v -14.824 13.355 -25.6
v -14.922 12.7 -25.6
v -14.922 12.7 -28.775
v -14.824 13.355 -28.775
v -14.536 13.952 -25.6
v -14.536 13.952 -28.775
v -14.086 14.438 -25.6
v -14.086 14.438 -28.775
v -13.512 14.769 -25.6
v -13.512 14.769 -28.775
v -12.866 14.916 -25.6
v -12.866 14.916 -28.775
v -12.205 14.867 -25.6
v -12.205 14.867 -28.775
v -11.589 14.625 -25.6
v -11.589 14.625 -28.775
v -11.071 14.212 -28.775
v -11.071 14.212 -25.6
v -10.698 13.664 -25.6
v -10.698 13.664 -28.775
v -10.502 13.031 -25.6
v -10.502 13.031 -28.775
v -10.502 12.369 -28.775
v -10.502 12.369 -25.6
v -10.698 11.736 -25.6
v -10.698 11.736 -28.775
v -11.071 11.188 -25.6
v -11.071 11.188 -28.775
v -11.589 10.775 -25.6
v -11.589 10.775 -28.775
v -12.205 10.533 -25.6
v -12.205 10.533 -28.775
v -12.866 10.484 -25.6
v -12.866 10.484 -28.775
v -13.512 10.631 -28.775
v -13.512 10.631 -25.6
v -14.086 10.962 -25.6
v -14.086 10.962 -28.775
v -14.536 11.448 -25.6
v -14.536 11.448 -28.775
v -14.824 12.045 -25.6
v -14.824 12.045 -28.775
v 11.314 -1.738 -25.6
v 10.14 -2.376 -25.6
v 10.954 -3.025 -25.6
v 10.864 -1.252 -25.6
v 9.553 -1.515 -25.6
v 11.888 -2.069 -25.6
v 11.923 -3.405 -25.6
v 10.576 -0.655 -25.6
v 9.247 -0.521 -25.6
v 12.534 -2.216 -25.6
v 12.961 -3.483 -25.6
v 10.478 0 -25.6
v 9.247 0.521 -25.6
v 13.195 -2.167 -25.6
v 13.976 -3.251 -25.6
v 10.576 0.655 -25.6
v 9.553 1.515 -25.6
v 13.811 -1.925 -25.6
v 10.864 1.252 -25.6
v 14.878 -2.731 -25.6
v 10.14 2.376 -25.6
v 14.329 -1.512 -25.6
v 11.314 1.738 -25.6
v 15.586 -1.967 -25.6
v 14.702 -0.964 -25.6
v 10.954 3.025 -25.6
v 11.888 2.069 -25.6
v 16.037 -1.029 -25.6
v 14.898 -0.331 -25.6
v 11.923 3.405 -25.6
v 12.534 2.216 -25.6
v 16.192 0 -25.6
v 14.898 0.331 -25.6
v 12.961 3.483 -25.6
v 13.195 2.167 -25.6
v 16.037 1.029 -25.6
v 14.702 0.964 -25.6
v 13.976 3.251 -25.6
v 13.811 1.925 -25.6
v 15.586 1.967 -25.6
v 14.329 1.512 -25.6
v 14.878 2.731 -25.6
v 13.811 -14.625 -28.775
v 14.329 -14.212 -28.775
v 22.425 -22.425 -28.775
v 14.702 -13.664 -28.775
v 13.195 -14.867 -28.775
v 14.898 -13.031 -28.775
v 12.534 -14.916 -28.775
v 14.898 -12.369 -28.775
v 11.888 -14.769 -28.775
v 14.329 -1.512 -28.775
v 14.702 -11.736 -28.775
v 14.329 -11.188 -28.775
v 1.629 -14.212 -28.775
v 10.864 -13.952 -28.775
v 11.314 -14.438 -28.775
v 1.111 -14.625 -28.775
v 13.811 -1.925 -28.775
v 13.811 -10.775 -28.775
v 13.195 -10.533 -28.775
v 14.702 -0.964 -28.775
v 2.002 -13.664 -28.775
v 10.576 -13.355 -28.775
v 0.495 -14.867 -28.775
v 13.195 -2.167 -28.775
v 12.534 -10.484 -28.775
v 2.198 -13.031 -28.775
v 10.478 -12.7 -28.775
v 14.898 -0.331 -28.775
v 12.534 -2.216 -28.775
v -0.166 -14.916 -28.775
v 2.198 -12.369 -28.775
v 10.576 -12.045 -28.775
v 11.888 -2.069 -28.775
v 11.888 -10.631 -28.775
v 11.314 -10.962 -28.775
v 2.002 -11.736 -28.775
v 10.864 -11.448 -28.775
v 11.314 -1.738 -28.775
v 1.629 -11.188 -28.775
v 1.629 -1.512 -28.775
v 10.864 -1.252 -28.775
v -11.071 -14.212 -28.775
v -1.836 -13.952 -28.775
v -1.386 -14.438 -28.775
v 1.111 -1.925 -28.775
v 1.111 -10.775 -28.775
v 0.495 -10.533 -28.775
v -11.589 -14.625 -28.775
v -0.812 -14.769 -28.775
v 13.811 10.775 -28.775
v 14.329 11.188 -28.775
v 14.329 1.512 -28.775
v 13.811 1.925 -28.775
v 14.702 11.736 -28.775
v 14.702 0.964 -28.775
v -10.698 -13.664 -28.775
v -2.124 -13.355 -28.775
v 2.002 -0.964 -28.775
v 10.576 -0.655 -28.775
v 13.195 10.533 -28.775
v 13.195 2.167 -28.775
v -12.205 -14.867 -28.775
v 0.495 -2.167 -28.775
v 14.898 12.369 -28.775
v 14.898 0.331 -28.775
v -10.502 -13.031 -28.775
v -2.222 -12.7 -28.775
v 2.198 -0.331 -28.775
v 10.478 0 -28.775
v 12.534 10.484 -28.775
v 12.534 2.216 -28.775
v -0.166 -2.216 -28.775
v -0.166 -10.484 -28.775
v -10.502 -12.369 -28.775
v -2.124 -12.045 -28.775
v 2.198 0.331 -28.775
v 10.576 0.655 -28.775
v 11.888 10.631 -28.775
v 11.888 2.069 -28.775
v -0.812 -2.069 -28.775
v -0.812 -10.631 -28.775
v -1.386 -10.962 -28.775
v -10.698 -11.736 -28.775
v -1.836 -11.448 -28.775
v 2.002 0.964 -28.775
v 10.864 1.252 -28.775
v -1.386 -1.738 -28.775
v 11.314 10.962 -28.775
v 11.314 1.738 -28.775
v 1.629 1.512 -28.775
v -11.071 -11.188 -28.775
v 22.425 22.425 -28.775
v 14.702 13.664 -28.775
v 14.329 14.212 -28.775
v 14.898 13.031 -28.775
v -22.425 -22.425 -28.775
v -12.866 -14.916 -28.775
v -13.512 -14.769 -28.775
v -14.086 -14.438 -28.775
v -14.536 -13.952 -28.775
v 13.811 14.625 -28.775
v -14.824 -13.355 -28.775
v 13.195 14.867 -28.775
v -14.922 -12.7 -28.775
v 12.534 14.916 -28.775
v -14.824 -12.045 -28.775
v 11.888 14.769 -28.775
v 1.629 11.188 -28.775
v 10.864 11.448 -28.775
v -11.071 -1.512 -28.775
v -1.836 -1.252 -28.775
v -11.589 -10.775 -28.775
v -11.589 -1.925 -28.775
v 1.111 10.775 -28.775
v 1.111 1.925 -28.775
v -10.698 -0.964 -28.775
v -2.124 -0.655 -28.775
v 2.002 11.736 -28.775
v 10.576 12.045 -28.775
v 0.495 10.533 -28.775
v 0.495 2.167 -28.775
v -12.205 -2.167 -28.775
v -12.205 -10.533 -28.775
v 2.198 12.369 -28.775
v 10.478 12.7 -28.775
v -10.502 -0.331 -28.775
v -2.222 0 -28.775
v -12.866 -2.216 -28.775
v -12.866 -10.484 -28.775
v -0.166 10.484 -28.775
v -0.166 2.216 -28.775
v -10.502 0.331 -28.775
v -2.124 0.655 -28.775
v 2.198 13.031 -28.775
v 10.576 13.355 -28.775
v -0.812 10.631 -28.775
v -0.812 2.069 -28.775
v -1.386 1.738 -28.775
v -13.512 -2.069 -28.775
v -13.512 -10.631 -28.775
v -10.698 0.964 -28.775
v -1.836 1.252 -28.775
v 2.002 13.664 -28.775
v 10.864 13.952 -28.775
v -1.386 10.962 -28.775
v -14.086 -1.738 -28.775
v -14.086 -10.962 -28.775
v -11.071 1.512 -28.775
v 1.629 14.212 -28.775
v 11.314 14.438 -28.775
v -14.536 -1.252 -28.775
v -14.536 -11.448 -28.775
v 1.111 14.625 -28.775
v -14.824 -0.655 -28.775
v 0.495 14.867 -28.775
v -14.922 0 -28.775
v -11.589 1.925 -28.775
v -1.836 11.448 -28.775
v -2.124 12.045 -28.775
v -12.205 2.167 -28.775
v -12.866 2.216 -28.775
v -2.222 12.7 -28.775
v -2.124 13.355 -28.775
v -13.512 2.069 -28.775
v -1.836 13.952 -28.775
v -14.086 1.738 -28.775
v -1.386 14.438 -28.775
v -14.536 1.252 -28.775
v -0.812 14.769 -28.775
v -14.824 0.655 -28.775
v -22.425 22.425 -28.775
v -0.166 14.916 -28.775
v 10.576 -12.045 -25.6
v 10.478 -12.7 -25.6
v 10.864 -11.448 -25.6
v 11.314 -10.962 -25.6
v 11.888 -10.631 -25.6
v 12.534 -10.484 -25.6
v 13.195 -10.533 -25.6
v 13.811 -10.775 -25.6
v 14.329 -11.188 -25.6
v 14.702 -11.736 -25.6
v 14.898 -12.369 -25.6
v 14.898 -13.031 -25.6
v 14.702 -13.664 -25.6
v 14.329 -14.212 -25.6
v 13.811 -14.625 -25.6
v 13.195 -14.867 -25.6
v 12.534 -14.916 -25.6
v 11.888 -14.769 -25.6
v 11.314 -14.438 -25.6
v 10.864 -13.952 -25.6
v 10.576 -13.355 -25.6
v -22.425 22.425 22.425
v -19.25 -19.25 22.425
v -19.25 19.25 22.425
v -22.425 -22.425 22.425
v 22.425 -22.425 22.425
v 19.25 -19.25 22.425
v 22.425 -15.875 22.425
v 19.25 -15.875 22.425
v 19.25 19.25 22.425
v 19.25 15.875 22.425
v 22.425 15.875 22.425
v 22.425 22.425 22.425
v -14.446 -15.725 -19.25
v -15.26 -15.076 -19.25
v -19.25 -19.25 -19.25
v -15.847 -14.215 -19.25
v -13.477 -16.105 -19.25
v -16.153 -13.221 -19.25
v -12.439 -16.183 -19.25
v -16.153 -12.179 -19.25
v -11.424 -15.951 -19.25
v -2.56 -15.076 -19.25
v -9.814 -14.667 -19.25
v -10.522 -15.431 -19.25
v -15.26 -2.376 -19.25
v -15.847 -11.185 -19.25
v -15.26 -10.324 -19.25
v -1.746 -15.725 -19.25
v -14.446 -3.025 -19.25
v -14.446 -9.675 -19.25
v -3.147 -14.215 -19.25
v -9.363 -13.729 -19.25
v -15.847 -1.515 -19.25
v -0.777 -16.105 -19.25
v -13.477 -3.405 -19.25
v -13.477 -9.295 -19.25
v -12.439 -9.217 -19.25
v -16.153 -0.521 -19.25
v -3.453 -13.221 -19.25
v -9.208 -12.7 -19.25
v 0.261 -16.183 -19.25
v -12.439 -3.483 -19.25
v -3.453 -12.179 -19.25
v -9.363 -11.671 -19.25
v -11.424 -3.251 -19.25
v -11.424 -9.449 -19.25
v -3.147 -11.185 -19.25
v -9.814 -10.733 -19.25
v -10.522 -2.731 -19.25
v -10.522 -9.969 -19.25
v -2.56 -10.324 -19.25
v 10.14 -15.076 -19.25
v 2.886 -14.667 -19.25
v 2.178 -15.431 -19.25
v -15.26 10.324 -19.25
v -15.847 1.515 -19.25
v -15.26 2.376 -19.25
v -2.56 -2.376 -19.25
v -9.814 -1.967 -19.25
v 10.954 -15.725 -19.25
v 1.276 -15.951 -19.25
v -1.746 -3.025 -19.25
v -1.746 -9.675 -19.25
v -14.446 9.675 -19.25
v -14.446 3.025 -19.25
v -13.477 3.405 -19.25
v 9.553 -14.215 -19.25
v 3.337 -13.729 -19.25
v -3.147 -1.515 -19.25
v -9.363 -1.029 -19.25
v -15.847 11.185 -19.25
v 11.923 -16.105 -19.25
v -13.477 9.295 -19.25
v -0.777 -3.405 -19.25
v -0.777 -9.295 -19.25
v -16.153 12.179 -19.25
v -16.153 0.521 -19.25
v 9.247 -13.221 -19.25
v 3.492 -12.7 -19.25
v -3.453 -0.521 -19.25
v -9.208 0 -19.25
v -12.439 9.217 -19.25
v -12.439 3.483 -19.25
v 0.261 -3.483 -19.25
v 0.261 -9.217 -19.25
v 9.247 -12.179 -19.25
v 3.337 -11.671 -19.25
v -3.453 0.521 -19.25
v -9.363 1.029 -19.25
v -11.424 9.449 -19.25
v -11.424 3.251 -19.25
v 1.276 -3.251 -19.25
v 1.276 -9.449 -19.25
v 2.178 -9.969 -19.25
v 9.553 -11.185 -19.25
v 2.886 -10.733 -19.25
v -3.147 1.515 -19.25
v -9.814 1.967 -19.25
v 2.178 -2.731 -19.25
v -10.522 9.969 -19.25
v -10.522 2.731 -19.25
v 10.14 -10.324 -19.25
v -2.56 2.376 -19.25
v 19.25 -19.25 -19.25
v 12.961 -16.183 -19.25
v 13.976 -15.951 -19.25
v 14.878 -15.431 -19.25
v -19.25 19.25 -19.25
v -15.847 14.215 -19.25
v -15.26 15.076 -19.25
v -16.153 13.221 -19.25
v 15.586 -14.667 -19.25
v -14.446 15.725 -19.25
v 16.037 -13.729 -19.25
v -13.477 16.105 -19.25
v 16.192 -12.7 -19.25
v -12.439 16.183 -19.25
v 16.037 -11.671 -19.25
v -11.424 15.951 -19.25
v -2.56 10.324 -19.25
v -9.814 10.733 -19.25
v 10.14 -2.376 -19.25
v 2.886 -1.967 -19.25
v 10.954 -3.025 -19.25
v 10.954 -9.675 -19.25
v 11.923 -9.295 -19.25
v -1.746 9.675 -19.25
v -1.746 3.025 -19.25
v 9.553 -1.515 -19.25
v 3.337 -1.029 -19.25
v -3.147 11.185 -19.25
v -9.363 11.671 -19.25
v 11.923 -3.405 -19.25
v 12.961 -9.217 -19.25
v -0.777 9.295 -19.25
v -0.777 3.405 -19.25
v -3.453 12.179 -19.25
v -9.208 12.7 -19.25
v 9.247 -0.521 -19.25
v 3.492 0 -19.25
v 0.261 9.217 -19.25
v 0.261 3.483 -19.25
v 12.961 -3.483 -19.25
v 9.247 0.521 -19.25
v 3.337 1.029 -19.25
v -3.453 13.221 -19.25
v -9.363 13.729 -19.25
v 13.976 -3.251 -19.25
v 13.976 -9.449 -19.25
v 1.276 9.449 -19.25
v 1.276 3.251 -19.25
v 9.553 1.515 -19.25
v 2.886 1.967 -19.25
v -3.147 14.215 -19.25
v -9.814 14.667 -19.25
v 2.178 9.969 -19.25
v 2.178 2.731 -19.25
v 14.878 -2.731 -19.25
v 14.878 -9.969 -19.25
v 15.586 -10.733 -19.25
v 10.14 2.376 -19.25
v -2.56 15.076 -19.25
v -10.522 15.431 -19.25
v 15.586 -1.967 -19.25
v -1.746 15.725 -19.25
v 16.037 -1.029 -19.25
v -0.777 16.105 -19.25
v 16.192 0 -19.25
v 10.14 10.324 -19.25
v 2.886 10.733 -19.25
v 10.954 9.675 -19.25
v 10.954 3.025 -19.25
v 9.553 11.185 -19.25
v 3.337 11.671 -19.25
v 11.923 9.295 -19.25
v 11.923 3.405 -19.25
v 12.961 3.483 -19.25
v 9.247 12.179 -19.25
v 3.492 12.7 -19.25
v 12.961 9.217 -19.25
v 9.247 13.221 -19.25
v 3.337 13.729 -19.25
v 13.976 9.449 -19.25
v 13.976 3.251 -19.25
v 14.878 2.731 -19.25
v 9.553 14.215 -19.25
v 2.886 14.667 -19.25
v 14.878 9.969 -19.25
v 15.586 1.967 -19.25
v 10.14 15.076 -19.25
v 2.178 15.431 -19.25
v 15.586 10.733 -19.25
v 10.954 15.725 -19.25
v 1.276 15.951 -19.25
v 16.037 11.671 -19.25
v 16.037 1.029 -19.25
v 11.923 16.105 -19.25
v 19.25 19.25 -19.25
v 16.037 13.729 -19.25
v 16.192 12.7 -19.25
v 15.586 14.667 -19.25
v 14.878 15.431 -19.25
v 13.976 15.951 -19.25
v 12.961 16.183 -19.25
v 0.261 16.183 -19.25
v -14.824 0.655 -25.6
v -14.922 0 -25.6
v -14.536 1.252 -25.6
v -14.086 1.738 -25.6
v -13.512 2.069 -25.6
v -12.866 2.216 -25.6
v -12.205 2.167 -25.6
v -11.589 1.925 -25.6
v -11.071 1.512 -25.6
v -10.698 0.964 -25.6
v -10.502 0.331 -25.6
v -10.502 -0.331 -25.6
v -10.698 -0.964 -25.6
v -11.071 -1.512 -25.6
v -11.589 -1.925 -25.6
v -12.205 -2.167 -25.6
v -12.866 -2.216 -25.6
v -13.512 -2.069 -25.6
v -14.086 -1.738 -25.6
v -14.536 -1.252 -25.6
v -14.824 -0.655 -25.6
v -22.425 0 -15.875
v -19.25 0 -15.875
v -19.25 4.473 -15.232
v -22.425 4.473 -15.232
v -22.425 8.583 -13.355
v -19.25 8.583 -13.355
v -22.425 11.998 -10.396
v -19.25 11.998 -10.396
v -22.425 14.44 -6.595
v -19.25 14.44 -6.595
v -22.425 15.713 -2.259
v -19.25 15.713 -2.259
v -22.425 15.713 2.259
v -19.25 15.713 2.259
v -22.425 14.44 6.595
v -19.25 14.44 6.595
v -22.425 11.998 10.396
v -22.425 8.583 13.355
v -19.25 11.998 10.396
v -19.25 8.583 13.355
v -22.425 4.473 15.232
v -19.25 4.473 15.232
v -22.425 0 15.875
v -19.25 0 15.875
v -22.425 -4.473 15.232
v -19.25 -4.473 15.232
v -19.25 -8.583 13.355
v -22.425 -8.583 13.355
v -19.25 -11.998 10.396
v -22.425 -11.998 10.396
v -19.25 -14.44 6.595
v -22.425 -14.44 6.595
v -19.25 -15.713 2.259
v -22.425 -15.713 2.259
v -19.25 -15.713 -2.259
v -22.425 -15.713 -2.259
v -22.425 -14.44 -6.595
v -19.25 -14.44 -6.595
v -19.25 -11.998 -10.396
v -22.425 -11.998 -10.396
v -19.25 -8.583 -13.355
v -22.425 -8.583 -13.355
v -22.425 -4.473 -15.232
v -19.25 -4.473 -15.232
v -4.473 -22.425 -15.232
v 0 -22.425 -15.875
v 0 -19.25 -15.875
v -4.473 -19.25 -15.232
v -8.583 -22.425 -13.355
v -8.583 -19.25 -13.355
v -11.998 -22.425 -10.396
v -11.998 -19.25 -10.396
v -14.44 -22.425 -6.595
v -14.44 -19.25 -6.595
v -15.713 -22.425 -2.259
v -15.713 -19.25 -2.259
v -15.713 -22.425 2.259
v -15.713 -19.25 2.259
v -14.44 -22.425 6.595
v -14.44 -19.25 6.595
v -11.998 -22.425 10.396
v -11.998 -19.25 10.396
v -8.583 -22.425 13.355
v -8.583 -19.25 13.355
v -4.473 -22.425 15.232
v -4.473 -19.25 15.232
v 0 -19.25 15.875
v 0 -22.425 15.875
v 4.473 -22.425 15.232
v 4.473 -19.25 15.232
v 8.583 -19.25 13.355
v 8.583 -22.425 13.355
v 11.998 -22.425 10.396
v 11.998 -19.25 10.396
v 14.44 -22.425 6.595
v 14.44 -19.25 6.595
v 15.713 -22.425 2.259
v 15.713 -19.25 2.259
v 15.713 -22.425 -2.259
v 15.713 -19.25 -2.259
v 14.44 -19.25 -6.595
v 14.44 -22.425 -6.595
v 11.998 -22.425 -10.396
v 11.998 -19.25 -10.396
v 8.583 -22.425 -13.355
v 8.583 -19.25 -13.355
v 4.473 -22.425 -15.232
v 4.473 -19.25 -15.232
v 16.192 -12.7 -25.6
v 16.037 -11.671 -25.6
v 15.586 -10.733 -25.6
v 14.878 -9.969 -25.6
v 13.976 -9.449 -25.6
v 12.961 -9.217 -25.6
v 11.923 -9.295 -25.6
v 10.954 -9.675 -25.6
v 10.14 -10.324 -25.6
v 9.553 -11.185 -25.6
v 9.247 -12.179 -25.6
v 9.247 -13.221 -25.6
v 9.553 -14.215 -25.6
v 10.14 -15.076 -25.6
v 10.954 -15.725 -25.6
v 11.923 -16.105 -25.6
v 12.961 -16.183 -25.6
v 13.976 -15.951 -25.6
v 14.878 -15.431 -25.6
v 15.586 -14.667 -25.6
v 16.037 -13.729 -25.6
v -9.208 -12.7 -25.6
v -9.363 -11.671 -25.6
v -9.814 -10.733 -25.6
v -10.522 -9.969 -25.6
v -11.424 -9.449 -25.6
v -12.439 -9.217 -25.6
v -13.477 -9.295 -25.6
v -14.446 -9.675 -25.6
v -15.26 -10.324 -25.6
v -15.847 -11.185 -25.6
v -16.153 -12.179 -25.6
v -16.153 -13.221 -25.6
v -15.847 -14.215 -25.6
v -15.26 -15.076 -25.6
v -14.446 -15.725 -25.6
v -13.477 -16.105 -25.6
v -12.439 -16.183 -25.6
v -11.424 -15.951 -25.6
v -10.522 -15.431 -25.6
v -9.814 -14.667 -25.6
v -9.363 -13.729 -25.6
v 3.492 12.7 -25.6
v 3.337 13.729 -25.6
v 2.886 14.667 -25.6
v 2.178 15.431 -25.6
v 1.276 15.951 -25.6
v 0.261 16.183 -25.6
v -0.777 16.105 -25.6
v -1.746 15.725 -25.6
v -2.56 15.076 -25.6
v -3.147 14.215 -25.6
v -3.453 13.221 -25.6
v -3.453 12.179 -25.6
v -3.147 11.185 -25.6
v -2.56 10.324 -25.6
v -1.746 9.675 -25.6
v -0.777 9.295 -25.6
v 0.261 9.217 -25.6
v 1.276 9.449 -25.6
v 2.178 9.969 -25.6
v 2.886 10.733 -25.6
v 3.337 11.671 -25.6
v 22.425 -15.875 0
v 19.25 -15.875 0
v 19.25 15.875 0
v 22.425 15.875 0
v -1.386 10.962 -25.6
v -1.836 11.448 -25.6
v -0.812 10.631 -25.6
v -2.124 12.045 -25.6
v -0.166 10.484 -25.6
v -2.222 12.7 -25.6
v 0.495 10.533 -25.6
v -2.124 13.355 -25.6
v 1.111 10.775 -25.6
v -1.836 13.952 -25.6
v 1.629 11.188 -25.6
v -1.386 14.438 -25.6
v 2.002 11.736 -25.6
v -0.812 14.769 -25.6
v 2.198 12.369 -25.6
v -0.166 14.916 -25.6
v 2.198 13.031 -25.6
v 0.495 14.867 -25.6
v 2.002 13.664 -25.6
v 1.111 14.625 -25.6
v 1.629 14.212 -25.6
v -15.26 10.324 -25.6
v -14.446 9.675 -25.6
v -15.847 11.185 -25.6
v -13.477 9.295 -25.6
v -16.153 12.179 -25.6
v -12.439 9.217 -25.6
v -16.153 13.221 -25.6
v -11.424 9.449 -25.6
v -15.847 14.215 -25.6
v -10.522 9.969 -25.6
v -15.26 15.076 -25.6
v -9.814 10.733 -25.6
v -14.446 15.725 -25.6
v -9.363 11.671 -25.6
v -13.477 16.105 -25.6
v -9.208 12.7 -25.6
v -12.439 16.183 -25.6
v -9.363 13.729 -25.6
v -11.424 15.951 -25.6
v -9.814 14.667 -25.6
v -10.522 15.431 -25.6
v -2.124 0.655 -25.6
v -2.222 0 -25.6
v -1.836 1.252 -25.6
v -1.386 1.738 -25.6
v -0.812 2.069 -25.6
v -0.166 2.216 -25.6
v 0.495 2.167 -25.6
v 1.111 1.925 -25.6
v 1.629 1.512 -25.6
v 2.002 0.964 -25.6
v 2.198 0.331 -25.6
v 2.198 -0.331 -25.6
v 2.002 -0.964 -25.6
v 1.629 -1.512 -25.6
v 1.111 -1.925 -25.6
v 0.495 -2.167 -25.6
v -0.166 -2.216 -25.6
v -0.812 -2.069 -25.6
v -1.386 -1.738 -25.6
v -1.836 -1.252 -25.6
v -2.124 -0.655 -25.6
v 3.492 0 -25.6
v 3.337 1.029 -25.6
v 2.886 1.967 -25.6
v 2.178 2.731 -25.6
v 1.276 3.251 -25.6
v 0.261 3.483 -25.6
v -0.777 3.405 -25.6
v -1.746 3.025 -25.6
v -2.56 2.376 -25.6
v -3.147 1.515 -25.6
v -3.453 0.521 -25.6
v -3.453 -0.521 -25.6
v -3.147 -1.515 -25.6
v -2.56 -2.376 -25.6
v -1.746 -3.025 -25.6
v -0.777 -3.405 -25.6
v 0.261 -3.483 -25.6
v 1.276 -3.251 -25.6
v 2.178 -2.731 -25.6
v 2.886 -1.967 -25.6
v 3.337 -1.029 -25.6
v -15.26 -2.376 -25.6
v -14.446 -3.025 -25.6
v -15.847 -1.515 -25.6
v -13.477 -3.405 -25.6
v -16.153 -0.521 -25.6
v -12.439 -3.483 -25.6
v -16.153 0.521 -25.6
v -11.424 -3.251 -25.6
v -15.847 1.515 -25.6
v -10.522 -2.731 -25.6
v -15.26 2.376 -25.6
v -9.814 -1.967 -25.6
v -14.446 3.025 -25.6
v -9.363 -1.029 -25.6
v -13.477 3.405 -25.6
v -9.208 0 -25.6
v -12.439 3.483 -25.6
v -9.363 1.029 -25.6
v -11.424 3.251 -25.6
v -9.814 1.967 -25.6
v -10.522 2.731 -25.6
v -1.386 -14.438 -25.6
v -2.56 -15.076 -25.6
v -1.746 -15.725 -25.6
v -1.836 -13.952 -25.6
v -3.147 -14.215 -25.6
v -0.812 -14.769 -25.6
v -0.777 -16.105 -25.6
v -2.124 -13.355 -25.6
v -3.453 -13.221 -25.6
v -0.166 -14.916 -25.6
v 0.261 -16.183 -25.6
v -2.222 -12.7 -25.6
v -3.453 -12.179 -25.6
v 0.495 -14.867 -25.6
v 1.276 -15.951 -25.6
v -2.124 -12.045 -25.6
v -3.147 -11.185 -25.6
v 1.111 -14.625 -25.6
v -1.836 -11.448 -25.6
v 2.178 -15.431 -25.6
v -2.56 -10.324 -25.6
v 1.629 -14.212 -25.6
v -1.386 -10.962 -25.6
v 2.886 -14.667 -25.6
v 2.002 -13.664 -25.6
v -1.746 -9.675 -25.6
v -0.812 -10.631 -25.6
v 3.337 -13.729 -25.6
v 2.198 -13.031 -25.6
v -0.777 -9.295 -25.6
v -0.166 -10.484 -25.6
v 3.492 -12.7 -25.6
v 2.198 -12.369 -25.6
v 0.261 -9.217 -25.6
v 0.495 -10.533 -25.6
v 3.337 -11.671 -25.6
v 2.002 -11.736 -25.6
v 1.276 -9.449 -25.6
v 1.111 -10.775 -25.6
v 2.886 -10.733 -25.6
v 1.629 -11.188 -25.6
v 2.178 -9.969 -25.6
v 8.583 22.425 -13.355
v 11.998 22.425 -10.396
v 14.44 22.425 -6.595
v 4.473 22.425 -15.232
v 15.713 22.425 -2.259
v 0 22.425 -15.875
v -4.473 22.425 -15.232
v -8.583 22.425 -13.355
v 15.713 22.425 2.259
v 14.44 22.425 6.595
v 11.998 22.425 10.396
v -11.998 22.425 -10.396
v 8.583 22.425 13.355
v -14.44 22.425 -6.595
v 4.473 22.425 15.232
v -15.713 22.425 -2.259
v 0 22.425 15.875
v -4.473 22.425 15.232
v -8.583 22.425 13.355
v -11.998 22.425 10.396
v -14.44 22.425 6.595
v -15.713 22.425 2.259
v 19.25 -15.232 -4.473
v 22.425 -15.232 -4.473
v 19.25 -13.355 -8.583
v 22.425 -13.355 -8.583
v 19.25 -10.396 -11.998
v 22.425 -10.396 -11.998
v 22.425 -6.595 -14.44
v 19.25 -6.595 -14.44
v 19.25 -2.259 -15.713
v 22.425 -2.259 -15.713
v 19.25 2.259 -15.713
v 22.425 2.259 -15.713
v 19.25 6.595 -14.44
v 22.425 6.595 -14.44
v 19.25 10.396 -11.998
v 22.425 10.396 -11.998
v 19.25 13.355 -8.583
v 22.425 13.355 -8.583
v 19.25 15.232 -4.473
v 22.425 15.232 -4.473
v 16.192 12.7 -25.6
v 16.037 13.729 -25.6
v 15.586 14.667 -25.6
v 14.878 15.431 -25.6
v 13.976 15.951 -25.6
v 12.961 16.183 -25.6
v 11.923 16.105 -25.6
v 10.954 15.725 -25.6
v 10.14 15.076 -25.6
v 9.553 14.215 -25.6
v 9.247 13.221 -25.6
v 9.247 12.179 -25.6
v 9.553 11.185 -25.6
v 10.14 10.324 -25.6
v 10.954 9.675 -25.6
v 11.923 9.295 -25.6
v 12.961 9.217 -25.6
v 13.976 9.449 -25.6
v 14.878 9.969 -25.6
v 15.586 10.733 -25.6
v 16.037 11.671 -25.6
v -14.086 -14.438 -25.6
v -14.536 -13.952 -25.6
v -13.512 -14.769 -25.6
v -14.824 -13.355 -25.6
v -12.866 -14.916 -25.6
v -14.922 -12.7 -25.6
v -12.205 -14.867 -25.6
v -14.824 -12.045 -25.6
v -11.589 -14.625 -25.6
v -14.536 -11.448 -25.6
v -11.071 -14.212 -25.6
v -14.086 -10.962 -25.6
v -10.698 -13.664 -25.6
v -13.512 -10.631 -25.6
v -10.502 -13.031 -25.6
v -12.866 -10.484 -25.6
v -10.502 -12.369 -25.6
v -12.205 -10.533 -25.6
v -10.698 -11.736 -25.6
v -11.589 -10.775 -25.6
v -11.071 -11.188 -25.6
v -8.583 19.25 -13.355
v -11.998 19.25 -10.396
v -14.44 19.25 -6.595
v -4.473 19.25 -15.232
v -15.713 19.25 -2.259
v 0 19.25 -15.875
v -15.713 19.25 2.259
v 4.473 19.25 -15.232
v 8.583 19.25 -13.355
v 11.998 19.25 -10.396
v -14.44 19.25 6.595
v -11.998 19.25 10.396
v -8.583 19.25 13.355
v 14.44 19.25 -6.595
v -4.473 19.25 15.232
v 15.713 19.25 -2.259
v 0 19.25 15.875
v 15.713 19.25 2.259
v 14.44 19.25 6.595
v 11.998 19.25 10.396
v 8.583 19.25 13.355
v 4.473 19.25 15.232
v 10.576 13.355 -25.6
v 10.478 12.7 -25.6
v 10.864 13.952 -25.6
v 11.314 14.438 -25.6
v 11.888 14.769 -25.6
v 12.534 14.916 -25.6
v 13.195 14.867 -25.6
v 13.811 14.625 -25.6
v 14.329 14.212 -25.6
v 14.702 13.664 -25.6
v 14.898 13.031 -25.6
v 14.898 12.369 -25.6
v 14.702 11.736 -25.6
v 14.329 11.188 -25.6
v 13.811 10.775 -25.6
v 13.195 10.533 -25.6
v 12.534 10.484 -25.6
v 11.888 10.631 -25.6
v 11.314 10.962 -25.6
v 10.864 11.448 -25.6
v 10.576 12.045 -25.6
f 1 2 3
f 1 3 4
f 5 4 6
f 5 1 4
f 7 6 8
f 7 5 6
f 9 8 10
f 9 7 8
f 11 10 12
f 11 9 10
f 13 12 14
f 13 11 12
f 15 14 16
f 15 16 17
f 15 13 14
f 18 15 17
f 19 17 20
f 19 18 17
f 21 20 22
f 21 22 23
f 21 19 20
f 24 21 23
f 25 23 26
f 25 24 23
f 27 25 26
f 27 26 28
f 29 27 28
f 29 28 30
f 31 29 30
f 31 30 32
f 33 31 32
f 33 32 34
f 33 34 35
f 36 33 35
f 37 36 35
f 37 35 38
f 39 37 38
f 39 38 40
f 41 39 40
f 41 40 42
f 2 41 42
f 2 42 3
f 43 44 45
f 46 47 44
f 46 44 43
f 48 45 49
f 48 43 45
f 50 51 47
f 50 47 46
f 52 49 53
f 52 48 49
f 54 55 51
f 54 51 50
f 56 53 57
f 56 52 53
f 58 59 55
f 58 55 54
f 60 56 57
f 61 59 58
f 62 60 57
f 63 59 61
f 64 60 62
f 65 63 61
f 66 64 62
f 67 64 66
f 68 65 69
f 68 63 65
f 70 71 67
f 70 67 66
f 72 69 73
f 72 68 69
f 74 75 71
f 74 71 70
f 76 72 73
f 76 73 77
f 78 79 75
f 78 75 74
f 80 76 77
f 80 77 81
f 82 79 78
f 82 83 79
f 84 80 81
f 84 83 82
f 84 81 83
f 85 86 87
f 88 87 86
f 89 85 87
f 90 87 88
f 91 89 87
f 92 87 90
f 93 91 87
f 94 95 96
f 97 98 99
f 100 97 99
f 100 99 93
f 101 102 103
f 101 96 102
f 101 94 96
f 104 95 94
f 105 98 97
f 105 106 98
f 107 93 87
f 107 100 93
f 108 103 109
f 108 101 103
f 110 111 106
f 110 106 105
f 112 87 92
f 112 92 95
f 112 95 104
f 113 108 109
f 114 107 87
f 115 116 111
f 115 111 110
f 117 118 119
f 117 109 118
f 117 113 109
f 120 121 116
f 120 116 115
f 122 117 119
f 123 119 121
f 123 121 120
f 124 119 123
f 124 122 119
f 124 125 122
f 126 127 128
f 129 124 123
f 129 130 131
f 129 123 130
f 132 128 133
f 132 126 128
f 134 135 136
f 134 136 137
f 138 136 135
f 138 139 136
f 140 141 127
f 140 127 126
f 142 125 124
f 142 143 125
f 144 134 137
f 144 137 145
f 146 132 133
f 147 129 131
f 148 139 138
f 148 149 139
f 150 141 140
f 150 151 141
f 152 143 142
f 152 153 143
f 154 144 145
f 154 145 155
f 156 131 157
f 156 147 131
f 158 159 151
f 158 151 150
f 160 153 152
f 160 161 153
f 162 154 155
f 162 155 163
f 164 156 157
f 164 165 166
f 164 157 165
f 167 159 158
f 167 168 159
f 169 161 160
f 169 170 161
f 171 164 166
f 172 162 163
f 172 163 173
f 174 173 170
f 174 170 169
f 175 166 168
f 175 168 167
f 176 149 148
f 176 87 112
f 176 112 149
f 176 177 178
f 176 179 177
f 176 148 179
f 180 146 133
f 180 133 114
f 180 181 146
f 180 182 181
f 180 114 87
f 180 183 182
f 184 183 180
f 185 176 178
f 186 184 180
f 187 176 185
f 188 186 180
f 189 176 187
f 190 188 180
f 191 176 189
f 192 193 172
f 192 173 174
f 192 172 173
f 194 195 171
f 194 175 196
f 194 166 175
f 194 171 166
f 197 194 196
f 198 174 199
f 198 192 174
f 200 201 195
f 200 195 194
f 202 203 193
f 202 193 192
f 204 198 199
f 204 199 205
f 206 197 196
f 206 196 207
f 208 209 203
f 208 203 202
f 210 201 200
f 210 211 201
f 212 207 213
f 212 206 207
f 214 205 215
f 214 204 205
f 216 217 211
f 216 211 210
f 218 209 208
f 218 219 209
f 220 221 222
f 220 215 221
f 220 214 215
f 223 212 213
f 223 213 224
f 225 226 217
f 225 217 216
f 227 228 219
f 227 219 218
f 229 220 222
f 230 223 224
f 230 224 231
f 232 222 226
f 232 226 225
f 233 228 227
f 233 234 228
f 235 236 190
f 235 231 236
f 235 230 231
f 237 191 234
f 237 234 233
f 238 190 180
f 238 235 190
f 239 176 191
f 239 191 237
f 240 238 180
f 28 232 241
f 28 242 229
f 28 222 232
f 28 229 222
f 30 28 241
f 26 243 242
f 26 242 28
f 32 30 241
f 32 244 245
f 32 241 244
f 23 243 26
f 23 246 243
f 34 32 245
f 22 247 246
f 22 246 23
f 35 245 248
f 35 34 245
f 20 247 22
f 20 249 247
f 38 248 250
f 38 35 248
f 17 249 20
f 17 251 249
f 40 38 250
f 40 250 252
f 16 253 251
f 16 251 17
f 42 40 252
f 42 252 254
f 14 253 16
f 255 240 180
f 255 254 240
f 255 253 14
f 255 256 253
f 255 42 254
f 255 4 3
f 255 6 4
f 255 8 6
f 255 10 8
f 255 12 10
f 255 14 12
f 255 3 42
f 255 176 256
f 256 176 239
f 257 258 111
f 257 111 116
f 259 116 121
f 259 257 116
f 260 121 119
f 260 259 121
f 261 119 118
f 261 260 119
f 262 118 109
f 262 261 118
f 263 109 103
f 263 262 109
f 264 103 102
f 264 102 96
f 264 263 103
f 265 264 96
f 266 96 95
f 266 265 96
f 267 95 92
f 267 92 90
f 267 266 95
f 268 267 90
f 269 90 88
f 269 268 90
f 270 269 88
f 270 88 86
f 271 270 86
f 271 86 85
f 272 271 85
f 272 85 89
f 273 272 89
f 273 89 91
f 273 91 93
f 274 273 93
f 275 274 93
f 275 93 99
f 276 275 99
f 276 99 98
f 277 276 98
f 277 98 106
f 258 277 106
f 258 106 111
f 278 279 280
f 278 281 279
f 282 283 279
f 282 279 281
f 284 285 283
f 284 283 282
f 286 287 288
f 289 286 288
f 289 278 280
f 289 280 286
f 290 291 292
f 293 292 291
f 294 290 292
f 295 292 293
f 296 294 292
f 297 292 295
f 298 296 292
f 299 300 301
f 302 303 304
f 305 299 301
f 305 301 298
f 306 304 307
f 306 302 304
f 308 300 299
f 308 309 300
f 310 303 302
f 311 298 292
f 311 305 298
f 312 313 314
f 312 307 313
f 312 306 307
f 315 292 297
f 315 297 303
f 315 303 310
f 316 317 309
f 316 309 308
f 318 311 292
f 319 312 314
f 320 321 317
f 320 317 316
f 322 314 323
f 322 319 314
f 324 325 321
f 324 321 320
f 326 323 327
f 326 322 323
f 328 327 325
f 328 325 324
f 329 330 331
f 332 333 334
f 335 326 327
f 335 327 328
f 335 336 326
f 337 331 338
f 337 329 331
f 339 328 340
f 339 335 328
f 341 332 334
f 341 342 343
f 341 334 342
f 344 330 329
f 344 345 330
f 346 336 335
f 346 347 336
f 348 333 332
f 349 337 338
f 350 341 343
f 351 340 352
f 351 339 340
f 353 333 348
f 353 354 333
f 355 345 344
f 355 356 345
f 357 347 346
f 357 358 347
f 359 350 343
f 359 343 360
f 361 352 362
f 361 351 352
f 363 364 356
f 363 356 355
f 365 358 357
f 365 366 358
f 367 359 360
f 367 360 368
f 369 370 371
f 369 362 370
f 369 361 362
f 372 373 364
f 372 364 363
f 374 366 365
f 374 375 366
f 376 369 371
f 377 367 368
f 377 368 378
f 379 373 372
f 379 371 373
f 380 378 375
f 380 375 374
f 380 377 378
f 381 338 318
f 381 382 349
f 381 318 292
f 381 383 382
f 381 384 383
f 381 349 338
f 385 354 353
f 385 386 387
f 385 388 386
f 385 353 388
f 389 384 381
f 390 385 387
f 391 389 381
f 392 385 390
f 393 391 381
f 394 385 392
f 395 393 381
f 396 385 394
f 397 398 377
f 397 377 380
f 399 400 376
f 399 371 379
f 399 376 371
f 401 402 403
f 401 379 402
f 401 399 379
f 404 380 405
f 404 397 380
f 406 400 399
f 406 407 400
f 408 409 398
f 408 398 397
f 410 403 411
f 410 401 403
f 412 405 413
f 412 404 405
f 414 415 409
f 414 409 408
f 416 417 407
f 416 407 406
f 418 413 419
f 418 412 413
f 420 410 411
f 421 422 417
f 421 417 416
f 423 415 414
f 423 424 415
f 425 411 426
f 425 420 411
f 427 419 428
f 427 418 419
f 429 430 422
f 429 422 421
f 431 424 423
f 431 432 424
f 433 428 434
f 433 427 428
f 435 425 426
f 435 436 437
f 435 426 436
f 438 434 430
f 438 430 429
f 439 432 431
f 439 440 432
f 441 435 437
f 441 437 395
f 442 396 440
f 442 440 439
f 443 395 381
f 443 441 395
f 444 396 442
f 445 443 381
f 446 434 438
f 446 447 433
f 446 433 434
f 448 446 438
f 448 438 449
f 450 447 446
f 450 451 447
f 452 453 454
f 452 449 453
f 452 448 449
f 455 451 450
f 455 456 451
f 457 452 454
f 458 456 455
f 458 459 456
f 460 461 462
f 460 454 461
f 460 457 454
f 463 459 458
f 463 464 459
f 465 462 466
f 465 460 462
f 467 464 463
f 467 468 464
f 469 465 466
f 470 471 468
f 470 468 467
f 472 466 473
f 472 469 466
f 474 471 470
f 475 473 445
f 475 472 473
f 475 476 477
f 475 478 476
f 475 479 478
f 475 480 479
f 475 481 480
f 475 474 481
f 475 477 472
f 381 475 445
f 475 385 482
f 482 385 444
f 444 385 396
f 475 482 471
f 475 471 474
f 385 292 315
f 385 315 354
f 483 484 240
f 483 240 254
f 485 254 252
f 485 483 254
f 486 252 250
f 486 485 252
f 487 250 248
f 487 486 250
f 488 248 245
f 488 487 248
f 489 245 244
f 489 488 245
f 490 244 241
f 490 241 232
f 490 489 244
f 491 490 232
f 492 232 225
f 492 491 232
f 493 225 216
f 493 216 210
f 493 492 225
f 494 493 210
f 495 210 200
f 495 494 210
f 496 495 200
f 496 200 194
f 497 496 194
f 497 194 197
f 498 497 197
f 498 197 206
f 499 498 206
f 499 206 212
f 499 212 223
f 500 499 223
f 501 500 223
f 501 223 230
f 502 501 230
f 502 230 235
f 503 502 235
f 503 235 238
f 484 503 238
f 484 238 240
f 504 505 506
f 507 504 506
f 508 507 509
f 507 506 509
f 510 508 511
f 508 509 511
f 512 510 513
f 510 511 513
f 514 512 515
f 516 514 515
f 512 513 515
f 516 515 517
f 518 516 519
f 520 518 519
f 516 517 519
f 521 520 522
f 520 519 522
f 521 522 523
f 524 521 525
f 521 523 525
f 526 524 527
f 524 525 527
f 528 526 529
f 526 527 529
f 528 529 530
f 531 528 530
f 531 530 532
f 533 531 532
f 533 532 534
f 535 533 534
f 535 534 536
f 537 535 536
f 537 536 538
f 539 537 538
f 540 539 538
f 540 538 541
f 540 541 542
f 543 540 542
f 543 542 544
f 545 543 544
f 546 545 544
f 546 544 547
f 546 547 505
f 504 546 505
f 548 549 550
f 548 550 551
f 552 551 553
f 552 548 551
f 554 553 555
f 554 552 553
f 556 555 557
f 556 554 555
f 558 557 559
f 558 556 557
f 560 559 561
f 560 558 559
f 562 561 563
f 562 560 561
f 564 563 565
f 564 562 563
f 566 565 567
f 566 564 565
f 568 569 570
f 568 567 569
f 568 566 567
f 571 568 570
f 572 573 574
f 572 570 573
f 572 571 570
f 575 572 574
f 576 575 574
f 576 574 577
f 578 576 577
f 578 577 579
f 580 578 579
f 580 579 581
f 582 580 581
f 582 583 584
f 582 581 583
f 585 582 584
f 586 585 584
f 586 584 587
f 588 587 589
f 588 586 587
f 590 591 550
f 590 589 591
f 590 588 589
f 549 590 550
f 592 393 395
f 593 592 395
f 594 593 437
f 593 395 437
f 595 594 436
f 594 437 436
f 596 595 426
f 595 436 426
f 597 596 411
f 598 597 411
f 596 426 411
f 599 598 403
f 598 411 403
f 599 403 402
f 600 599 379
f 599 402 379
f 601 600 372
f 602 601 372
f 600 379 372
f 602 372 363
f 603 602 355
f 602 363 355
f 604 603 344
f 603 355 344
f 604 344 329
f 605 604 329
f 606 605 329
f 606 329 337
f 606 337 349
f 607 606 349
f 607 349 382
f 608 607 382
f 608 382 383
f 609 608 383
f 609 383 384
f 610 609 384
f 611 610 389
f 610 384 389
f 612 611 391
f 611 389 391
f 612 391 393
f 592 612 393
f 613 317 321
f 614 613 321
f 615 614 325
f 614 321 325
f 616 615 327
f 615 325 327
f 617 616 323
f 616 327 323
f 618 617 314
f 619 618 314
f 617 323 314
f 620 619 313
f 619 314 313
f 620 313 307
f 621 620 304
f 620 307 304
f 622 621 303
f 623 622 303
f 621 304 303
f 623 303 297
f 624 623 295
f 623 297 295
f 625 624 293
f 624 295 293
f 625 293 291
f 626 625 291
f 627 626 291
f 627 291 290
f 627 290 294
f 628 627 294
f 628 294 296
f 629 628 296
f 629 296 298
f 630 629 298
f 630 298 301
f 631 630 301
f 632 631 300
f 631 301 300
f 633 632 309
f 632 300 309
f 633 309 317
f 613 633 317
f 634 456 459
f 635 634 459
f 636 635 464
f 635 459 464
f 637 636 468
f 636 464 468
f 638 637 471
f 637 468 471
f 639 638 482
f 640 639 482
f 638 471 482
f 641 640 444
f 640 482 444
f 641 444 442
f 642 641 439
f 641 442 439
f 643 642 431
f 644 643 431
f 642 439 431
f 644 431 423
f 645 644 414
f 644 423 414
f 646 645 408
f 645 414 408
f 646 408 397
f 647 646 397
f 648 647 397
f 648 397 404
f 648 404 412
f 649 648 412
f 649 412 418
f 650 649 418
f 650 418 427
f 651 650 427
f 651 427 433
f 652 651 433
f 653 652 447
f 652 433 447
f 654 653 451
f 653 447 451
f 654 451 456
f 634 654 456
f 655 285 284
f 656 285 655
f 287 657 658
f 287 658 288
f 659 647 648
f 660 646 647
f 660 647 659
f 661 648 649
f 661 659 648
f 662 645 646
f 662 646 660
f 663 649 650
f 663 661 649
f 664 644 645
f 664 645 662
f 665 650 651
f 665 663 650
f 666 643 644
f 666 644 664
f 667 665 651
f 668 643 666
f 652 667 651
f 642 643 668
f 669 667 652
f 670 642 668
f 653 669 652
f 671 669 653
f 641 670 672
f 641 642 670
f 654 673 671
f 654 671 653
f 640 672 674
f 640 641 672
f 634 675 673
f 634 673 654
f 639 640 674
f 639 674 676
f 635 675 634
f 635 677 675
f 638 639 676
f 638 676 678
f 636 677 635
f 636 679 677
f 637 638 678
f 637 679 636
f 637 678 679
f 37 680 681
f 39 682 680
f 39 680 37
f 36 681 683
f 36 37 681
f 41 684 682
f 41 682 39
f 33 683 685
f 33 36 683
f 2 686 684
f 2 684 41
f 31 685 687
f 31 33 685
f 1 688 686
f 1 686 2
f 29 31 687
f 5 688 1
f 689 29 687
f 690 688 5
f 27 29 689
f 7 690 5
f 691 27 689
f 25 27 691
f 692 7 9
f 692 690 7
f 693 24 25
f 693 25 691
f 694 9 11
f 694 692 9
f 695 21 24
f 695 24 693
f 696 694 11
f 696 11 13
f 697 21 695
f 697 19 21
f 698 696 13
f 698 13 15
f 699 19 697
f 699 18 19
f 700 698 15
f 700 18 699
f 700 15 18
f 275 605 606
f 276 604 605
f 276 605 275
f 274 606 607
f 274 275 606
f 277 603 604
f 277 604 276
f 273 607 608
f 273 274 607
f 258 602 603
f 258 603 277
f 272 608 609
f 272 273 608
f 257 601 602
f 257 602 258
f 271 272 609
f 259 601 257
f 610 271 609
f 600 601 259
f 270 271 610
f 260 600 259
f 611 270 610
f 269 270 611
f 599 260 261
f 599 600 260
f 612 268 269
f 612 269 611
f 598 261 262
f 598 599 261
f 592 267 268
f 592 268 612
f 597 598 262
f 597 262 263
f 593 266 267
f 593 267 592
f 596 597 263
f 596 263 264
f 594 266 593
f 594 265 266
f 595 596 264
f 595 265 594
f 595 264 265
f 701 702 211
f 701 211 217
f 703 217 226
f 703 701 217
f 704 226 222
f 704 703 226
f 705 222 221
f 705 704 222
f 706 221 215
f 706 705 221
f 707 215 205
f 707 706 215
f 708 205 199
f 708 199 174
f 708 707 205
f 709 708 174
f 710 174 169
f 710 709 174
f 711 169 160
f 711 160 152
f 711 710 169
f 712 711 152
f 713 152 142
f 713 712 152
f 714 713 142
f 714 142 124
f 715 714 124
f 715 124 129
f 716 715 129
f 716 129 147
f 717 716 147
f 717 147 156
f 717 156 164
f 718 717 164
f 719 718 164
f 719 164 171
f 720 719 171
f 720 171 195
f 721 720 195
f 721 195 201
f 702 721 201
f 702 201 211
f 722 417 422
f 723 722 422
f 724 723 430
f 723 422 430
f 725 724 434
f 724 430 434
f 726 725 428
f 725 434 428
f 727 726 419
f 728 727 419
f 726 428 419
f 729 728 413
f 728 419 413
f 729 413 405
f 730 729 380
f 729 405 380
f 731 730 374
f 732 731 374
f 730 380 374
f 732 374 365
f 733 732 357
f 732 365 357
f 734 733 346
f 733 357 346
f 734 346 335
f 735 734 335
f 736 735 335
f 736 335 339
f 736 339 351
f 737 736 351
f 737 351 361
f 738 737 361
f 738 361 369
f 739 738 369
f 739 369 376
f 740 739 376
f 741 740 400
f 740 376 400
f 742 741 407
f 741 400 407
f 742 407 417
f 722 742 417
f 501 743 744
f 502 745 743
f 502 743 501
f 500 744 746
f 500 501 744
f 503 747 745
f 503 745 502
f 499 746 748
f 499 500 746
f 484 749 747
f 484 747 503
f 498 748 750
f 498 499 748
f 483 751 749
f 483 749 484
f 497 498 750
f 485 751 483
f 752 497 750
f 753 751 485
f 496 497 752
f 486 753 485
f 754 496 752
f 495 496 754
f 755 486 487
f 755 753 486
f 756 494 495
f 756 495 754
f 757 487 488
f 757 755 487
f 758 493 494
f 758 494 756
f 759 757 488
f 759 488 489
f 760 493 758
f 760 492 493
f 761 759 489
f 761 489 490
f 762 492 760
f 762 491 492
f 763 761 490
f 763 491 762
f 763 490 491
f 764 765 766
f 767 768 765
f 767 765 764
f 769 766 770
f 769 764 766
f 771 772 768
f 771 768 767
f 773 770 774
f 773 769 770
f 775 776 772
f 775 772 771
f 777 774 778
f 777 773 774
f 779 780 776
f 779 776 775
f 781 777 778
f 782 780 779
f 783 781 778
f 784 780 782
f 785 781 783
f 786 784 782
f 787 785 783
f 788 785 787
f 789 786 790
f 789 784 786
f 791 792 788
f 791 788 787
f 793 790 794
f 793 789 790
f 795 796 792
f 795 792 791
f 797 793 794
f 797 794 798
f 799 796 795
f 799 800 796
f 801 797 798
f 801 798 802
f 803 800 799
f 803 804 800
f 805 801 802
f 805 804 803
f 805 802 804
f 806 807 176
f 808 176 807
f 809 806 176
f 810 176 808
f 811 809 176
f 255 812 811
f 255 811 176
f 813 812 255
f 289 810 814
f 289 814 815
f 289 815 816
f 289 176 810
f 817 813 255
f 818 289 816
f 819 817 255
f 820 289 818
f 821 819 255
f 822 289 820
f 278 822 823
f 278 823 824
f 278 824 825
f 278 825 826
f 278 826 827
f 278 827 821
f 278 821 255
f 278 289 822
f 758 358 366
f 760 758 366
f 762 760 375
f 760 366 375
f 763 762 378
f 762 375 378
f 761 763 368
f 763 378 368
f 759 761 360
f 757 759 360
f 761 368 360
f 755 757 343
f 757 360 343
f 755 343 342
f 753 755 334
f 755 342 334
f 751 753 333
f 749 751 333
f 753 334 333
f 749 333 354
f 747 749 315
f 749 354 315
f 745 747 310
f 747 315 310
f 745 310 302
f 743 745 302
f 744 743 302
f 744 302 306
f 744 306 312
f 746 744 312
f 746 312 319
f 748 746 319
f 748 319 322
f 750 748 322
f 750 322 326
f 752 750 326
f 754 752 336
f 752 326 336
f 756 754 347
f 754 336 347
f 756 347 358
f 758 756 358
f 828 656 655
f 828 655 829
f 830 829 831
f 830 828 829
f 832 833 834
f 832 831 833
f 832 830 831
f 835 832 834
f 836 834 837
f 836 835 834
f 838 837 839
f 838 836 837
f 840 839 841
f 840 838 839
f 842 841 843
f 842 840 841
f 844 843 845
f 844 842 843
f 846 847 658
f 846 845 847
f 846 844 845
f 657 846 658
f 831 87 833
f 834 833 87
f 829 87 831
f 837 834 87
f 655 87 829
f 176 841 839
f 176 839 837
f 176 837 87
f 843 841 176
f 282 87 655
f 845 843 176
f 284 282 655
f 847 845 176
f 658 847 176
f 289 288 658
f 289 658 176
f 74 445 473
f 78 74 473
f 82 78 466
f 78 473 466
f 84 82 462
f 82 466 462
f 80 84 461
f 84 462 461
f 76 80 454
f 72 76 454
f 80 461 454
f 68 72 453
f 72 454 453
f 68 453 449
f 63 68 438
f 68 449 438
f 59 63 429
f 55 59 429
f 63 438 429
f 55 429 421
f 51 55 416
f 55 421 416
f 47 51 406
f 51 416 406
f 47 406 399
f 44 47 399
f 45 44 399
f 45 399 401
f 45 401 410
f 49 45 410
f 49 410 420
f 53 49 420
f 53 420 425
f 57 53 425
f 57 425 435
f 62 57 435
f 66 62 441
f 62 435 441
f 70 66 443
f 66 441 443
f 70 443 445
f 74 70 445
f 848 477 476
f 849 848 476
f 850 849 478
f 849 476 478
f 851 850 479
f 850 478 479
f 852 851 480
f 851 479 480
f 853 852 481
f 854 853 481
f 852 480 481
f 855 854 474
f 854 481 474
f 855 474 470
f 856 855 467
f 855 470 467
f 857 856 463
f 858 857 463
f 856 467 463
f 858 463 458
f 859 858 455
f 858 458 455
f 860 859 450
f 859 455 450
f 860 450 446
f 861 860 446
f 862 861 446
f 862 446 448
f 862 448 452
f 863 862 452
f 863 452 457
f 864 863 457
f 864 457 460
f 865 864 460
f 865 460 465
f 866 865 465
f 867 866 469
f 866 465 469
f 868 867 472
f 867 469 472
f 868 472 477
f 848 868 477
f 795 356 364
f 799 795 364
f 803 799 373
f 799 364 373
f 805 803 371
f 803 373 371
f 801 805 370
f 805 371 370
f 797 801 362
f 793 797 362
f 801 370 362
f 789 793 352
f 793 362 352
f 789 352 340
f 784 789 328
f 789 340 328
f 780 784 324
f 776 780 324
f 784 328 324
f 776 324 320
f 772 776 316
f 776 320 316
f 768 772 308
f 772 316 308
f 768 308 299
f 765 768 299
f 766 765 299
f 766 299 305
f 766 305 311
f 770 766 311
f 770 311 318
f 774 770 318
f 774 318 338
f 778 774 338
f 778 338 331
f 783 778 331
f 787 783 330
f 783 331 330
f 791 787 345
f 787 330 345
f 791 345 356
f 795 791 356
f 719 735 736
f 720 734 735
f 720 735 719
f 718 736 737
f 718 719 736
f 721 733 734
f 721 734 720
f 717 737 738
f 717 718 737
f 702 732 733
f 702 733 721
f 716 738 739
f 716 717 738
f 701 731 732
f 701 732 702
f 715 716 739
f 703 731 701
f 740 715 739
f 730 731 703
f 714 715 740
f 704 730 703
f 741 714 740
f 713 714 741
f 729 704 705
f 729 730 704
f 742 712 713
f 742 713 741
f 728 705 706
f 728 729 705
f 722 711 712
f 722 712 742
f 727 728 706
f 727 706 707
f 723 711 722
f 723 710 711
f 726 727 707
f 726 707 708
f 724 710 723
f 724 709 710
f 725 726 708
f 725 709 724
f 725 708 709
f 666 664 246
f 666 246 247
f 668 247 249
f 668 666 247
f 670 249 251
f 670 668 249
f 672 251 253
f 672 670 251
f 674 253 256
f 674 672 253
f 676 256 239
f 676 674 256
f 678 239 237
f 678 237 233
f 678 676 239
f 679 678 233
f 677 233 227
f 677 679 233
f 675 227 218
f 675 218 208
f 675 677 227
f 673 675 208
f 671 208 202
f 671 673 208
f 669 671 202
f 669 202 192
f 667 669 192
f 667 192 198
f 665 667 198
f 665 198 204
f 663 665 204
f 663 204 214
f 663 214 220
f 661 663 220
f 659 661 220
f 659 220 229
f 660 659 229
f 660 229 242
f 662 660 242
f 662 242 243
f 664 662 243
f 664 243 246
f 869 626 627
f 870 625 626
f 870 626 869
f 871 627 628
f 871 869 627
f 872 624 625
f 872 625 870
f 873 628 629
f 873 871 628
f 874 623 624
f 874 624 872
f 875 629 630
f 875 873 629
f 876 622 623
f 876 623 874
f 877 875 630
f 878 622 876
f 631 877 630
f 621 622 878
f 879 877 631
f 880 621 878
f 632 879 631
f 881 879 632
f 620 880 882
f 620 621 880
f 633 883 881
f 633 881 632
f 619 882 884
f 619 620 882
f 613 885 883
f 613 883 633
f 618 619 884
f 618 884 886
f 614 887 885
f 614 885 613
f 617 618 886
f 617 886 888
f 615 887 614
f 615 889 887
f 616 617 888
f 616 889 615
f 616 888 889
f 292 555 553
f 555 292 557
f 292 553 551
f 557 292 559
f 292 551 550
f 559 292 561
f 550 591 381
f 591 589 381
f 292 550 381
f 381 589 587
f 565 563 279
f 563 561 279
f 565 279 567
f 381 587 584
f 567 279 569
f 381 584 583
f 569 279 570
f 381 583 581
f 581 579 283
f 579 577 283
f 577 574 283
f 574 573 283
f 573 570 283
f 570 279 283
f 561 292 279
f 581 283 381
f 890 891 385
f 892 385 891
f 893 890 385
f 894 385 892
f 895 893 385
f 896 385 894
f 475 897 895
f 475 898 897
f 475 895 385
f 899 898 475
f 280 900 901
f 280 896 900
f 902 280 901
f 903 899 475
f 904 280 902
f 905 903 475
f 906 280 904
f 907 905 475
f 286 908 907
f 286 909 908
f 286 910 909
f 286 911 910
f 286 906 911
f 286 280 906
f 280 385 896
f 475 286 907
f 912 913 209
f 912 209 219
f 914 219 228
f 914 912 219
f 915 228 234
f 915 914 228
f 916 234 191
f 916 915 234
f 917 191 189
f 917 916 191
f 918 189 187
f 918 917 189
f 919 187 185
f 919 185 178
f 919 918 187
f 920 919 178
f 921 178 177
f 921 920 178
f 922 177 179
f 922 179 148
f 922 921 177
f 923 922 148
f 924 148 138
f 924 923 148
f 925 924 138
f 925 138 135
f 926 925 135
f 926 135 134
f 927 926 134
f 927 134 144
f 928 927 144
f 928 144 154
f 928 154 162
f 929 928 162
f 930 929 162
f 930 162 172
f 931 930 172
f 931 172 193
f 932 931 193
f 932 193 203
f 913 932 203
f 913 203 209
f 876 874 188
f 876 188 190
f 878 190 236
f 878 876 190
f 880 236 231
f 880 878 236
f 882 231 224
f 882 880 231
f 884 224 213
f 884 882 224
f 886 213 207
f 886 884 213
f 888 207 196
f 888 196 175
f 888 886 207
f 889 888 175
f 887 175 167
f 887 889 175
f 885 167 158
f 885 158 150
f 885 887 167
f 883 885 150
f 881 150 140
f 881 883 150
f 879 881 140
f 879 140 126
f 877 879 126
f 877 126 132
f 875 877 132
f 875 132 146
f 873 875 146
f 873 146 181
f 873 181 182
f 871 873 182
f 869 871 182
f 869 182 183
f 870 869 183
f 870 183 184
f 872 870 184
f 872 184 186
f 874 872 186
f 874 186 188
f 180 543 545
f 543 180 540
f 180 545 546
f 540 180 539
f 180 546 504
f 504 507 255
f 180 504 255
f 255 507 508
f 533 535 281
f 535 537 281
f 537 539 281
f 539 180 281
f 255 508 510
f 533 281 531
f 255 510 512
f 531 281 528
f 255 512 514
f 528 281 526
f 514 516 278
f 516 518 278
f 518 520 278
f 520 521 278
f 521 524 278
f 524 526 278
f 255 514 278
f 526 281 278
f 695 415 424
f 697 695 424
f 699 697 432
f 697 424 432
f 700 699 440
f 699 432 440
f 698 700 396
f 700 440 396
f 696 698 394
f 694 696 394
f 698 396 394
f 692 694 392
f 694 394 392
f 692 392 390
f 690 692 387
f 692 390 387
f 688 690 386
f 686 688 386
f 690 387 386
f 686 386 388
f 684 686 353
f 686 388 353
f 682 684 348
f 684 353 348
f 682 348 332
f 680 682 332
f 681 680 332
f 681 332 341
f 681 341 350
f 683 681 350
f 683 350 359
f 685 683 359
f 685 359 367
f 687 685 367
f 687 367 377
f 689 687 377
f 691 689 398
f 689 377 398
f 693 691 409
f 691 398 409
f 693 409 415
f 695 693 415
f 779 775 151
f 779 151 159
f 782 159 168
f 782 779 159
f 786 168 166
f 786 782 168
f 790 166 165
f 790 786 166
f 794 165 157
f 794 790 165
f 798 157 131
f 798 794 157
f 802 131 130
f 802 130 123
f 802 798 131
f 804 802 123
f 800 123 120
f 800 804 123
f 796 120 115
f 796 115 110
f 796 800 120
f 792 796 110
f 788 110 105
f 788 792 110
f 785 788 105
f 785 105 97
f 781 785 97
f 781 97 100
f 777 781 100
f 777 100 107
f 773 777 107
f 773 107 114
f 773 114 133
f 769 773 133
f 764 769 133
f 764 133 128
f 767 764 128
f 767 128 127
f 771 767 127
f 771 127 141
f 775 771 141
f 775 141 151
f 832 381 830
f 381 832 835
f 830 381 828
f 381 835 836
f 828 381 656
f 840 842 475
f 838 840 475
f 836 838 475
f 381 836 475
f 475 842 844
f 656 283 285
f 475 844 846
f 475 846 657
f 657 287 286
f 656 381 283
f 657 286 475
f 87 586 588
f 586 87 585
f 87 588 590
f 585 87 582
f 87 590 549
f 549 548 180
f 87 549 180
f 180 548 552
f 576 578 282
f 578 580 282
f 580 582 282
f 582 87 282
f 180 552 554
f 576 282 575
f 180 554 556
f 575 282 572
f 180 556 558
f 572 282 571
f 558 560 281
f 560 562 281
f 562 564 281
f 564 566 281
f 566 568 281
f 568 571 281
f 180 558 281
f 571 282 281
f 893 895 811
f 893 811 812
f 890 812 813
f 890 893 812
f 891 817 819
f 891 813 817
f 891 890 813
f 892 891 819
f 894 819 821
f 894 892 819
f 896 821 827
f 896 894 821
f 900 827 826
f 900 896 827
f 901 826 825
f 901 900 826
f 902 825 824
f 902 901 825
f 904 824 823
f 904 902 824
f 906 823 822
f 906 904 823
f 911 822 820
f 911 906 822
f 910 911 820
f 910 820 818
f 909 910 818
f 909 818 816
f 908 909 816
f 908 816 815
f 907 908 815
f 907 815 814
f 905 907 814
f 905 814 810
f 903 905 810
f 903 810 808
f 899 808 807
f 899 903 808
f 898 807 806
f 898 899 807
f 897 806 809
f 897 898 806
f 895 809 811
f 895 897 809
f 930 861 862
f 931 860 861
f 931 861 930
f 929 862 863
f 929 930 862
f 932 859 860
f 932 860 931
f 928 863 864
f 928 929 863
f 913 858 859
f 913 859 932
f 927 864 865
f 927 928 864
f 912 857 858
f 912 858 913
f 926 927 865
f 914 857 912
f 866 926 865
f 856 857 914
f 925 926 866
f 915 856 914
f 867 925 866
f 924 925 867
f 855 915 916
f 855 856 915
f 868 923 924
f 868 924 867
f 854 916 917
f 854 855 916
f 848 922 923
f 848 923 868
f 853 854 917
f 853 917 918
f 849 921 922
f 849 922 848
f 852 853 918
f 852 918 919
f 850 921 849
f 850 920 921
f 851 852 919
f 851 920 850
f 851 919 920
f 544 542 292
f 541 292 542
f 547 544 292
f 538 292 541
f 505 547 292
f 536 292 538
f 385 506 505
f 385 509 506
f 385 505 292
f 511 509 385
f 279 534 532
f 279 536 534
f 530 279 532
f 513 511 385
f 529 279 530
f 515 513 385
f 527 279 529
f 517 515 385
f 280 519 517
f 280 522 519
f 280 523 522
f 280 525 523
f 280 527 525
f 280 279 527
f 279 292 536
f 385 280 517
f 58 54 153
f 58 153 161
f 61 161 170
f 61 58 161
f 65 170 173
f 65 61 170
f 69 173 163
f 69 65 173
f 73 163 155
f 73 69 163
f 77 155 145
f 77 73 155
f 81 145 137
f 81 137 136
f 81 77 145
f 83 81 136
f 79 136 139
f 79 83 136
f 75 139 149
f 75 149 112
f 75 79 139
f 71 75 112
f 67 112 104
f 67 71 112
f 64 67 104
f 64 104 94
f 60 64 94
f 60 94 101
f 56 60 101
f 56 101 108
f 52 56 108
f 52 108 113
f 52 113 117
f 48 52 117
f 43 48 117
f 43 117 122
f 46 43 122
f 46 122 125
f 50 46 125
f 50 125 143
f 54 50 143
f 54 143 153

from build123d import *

# Parameters (mm, degrees)
SKETCH1_W           = 44.85
SKETCH1_H           = 44.85
SKETCH1_W_2         = 38.5
SKETCH1_H_2         = 38.5
BOSS_EXTRUDE1_DEPTH = 19.25
SKETCH2_W           = 44.85
SKETCH2_H           = 44.85
BOSS_EXTRUDE2_DEPTH = 3.175
SKETCH3_W           = 44.85
SKETCH3_H           = 44.85
BOSS_EXTRUDE3_DEPTH = 3.175
SKETCH5_R           = 15.875
CUT_EXTRUDE1_DEPTH  = 68.275
SKETCH8_W           = 44.85
SKETCH8_H           = 44.85
SKETCH8_R           = 2.2225
BOSS_EXTRUDE4_DEPTH = 6.35
SKETCH9_R           = 3.4925
CUT_EXTRUDE4_DEPTH  = 6.35
CUT_EXTRUDE5_REACH  = 62.226
SKETCH10_W          = 38.5
SKETCH10_H          = 38.5
CUT_EXTRUDE3_DEPTH  = 43.822445925
SKETCH11_R          = 15.875
CUT_EXTRUDE6_DEPTH  = 43.822445925


with BuildPart() as part:
    # Sketch1 → Boss-Extrude1 (new, symmetric)
    with BuildSketch(Plane(origin=(0, 0, 0), x_dir=(1, 0, 0), z_dir=(0, 1, 0))):
        Rectangle(SKETCH1_W, SKETCH1_H)
        Rectangle(SKETCH1_W_2, SKETCH1_H_2, mode=Mode.SUBTRACT)
    extrude(amount=BOSS_EXTRUDE1_DEPTH, both=True)

    # Sketch2 → Boss-Extrude2 (add)
    with BuildSketch(Plane(origin=(0, 19.25, 0), x_dir=(1, 0, 0), z_dir=(0, 1, 0))):
        Rectangle(SKETCH2_W, SKETCH2_H)
    extrude(amount=BOSS_EXTRUDE2_DEPTH)

    # Sketch3 → Boss-Extrude3 (add)
    with BuildSketch(Plane.XZ.offset(19.25)):
        Rectangle(SKETCH3_W, SKETCH3_H)
    extrude(amount=BOSS_EXTRUDE3_DEPTH)

    # Sketch5 → Cut-Extrude1 (cut, through all)
    with BuildSketch(Plane(origin=(0, -22.425, -22.425), x_dir=(1, 0, 0), z_dir=(0, 1, 0))):
        with Locations(Location((0, -22.425, 0), (0, 0, 90))):
            Circle(SKETCH5_R)
    extrude(amount=CUT_EXTRUDE1_DEPTH, mode=Mode.SUBTRACT)

    # Sketch8 → Boss-Extrude4 (add)
    with BuildSketch(Plane(origin=(0, 0, -22.425), x_dir=(-1, 0, 0), z_dir=(0, 0, -1))):
        Rectangle(SKETCH8_W, SKETCH8_H)
        with Locations((-12.7, 12.7)):
            Circle(SKETCH8_R, mode=Mode.SUBTRACT)
        with Locations((0, 12.7)):
            Circle(SKETCH8_R, mode=Mode.SUBTRACT)
        with Locations((12.7, 12.7)):
            Circle(SKETCH8_R, mode=Mode.SUBTRACT)
        Circle(SKETCH8_R, mode=Mode.SUBTRACT)
        with Locations((12.7, 0)):
            Circle(SKETCH8_R, mode=Mode.SUBTRACT)
        with Locations((0, -12.7)):
            Circle(SKETCH8_R, mode=Mode.SUBTRACT)
        with Locations((12.7, -12.7)):
            Circle(SKETCH8_R, mode=Mode.SUBTRACT)
        with Locations((-12.7, 0)):
            Circle(SKETCH8_R, mode=Mode.SUBTRACT)
        with Locations((-12.7, -12.7)):
            Circle(SKETCH8_R, mode=Mode.SUBTRACT)
    extrude(amount=BOSS_EXTRUDE4_DEPTH)

    # Sketch9 → Cut-Extrude4 (cut)
    with BuildSketch(Plane.XY.offset(-19.25)):
        with Locations((12.7, 12.7)):
            Circle(SKETCH9_R)
        with Locations((0, 12.7)):
            Circle(SKETCH9_R)
        with Locations((-12.7, 12.7)):
            Circle(SKETCH9_R)
        Circle(SKETCH9_R)
        with Locations((-12.7, 0)):
            Circle(SKETCH9_R)
        with Locations((0, -12.7)):
            Circle(SKETCH9_R)
        with Locations((-12.7, -12.7)):
            Circle(SKETCH9_R)
        with Locations((12.7, 0)):
            Circle(SKETCH9_R)
        with Locations((12.7, -12.7)):
            Circle(SKETCH9_R)
    extrude(amount=-CUT_EXTRUDE4_DEPTH, mode=Mode.SUBTRACT)

    # Sketch10 → Cut-Extrude5 (cut, up to next)
    with BuildSketch(Plane.XY.offset(22.425), mode=Mode.PRIVATE) as cut_extrude5_sk1:
        Rectangle(SKETCH10_W, SKETCH10_H)
    cut_extrude5_tool1 = extrude(cut_extrude5_sk1.sketch, amount=-CUT_EXTRUDE5_REACH, mode=Mode.PRIVATE) & part.part
    add(cut_extrude5_tool1.solids().sort_by_distance((0, 0, 22.425))[0], mode=Mode.SUBTRACT)

    # Sketch7 → Cut-Extrude3 (cut, through all)
    with BuildSketch(Plane.ZY):
        with BuildLine():
            Line((0, 15.875), (25, 15.875))
            Line((25, 15.875), (25, -15.875))
            Line((25, -15.875), (0, -15.875))
            ThreePointArc((0, -15.875), (-15.875, 0), (0, 15.875))
        make_face()
    extrude(amount=-CUT_EXTRUDE3_DEPTH, mode=Mode.SUBTRACT)

    # Sketch11 → Cut-Extrude6 (cut, through all)
    with BuildSketch(Plane(origin=(0, 0, 0), x_dir=(0, 0, -1), z_dir=(1, 0, 0))):
        Circle(SKETCH11_R)
    extrude(amount=-CUT_EXTRUDE6_DEPTH, mode=Mode.SUBTRACT)


solid = part.part
